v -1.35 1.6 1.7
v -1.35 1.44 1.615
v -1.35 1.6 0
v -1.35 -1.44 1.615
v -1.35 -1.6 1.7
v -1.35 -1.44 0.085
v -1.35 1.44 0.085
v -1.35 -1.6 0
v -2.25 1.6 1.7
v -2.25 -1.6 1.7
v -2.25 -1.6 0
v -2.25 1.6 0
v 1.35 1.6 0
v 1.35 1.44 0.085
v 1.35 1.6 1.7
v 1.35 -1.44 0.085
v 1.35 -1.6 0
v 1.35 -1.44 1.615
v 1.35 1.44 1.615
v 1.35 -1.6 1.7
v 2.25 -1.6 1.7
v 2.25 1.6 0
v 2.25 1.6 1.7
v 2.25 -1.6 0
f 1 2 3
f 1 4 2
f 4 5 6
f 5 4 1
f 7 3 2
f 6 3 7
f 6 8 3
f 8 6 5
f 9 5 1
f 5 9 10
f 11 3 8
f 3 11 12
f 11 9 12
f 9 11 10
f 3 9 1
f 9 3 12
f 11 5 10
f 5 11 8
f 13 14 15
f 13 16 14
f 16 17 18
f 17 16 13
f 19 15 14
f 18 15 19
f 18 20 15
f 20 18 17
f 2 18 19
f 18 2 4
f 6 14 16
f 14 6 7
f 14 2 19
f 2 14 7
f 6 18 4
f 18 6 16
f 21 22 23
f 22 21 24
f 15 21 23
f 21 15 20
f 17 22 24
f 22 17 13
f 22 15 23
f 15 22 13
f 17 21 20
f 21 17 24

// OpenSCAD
// SMD capacitors
module smd_cap(type){

    // Select following type-size:
    //		0	0402 / 1005
    //		1	0603 / 1608
    //		2	0805 / 2012
    //		3	1206 / 3216
    //		4	1210 / 3225
    //		5	1812 / 4532
    //		6	1825 / 4564
    //		7	2010 / 5025
    //		8	2512 / 6332

    l	= [1.0, 1.6, 2.0, 3.2, 3.2, 4.5, 4.5, 5.6, 5.6];
    w	= [0.5, 0.8, 1.25, 1.6, 2.5, 3.2, 6.4, 5.0, 6.3];
    h	= [0.55, 0.9, 1.3, 1.5, 1.7, 1.7, 1.7, 1.8, 2.0];

    border = 0.2;
    thin = 0.1;

    color_border = [1,1,0];
    color_body = [1,0,0];

    x1 = l[type]*border;
    x2 = l[type]*(1-border);

    union() translate([-((l[type]/2)-x1/2), 0, (h[type]/2)]) {

        translate([0,0,0]) color(color_border) {
            cube([x1, w[type], h[type]], center=true);
        }

        translate([2*x1,0,0]) color(color_body) {
            cube([l[type]-2*x1, w[type]*(1-thin), h[type]*(1-thin)], center=true);
        }

        translate([x2,0,0]) color(color_border) {
            cube([x1, w[type], h[type]], center=true);
        }

	} // union

} // smd_cap

smd_cap(5);
